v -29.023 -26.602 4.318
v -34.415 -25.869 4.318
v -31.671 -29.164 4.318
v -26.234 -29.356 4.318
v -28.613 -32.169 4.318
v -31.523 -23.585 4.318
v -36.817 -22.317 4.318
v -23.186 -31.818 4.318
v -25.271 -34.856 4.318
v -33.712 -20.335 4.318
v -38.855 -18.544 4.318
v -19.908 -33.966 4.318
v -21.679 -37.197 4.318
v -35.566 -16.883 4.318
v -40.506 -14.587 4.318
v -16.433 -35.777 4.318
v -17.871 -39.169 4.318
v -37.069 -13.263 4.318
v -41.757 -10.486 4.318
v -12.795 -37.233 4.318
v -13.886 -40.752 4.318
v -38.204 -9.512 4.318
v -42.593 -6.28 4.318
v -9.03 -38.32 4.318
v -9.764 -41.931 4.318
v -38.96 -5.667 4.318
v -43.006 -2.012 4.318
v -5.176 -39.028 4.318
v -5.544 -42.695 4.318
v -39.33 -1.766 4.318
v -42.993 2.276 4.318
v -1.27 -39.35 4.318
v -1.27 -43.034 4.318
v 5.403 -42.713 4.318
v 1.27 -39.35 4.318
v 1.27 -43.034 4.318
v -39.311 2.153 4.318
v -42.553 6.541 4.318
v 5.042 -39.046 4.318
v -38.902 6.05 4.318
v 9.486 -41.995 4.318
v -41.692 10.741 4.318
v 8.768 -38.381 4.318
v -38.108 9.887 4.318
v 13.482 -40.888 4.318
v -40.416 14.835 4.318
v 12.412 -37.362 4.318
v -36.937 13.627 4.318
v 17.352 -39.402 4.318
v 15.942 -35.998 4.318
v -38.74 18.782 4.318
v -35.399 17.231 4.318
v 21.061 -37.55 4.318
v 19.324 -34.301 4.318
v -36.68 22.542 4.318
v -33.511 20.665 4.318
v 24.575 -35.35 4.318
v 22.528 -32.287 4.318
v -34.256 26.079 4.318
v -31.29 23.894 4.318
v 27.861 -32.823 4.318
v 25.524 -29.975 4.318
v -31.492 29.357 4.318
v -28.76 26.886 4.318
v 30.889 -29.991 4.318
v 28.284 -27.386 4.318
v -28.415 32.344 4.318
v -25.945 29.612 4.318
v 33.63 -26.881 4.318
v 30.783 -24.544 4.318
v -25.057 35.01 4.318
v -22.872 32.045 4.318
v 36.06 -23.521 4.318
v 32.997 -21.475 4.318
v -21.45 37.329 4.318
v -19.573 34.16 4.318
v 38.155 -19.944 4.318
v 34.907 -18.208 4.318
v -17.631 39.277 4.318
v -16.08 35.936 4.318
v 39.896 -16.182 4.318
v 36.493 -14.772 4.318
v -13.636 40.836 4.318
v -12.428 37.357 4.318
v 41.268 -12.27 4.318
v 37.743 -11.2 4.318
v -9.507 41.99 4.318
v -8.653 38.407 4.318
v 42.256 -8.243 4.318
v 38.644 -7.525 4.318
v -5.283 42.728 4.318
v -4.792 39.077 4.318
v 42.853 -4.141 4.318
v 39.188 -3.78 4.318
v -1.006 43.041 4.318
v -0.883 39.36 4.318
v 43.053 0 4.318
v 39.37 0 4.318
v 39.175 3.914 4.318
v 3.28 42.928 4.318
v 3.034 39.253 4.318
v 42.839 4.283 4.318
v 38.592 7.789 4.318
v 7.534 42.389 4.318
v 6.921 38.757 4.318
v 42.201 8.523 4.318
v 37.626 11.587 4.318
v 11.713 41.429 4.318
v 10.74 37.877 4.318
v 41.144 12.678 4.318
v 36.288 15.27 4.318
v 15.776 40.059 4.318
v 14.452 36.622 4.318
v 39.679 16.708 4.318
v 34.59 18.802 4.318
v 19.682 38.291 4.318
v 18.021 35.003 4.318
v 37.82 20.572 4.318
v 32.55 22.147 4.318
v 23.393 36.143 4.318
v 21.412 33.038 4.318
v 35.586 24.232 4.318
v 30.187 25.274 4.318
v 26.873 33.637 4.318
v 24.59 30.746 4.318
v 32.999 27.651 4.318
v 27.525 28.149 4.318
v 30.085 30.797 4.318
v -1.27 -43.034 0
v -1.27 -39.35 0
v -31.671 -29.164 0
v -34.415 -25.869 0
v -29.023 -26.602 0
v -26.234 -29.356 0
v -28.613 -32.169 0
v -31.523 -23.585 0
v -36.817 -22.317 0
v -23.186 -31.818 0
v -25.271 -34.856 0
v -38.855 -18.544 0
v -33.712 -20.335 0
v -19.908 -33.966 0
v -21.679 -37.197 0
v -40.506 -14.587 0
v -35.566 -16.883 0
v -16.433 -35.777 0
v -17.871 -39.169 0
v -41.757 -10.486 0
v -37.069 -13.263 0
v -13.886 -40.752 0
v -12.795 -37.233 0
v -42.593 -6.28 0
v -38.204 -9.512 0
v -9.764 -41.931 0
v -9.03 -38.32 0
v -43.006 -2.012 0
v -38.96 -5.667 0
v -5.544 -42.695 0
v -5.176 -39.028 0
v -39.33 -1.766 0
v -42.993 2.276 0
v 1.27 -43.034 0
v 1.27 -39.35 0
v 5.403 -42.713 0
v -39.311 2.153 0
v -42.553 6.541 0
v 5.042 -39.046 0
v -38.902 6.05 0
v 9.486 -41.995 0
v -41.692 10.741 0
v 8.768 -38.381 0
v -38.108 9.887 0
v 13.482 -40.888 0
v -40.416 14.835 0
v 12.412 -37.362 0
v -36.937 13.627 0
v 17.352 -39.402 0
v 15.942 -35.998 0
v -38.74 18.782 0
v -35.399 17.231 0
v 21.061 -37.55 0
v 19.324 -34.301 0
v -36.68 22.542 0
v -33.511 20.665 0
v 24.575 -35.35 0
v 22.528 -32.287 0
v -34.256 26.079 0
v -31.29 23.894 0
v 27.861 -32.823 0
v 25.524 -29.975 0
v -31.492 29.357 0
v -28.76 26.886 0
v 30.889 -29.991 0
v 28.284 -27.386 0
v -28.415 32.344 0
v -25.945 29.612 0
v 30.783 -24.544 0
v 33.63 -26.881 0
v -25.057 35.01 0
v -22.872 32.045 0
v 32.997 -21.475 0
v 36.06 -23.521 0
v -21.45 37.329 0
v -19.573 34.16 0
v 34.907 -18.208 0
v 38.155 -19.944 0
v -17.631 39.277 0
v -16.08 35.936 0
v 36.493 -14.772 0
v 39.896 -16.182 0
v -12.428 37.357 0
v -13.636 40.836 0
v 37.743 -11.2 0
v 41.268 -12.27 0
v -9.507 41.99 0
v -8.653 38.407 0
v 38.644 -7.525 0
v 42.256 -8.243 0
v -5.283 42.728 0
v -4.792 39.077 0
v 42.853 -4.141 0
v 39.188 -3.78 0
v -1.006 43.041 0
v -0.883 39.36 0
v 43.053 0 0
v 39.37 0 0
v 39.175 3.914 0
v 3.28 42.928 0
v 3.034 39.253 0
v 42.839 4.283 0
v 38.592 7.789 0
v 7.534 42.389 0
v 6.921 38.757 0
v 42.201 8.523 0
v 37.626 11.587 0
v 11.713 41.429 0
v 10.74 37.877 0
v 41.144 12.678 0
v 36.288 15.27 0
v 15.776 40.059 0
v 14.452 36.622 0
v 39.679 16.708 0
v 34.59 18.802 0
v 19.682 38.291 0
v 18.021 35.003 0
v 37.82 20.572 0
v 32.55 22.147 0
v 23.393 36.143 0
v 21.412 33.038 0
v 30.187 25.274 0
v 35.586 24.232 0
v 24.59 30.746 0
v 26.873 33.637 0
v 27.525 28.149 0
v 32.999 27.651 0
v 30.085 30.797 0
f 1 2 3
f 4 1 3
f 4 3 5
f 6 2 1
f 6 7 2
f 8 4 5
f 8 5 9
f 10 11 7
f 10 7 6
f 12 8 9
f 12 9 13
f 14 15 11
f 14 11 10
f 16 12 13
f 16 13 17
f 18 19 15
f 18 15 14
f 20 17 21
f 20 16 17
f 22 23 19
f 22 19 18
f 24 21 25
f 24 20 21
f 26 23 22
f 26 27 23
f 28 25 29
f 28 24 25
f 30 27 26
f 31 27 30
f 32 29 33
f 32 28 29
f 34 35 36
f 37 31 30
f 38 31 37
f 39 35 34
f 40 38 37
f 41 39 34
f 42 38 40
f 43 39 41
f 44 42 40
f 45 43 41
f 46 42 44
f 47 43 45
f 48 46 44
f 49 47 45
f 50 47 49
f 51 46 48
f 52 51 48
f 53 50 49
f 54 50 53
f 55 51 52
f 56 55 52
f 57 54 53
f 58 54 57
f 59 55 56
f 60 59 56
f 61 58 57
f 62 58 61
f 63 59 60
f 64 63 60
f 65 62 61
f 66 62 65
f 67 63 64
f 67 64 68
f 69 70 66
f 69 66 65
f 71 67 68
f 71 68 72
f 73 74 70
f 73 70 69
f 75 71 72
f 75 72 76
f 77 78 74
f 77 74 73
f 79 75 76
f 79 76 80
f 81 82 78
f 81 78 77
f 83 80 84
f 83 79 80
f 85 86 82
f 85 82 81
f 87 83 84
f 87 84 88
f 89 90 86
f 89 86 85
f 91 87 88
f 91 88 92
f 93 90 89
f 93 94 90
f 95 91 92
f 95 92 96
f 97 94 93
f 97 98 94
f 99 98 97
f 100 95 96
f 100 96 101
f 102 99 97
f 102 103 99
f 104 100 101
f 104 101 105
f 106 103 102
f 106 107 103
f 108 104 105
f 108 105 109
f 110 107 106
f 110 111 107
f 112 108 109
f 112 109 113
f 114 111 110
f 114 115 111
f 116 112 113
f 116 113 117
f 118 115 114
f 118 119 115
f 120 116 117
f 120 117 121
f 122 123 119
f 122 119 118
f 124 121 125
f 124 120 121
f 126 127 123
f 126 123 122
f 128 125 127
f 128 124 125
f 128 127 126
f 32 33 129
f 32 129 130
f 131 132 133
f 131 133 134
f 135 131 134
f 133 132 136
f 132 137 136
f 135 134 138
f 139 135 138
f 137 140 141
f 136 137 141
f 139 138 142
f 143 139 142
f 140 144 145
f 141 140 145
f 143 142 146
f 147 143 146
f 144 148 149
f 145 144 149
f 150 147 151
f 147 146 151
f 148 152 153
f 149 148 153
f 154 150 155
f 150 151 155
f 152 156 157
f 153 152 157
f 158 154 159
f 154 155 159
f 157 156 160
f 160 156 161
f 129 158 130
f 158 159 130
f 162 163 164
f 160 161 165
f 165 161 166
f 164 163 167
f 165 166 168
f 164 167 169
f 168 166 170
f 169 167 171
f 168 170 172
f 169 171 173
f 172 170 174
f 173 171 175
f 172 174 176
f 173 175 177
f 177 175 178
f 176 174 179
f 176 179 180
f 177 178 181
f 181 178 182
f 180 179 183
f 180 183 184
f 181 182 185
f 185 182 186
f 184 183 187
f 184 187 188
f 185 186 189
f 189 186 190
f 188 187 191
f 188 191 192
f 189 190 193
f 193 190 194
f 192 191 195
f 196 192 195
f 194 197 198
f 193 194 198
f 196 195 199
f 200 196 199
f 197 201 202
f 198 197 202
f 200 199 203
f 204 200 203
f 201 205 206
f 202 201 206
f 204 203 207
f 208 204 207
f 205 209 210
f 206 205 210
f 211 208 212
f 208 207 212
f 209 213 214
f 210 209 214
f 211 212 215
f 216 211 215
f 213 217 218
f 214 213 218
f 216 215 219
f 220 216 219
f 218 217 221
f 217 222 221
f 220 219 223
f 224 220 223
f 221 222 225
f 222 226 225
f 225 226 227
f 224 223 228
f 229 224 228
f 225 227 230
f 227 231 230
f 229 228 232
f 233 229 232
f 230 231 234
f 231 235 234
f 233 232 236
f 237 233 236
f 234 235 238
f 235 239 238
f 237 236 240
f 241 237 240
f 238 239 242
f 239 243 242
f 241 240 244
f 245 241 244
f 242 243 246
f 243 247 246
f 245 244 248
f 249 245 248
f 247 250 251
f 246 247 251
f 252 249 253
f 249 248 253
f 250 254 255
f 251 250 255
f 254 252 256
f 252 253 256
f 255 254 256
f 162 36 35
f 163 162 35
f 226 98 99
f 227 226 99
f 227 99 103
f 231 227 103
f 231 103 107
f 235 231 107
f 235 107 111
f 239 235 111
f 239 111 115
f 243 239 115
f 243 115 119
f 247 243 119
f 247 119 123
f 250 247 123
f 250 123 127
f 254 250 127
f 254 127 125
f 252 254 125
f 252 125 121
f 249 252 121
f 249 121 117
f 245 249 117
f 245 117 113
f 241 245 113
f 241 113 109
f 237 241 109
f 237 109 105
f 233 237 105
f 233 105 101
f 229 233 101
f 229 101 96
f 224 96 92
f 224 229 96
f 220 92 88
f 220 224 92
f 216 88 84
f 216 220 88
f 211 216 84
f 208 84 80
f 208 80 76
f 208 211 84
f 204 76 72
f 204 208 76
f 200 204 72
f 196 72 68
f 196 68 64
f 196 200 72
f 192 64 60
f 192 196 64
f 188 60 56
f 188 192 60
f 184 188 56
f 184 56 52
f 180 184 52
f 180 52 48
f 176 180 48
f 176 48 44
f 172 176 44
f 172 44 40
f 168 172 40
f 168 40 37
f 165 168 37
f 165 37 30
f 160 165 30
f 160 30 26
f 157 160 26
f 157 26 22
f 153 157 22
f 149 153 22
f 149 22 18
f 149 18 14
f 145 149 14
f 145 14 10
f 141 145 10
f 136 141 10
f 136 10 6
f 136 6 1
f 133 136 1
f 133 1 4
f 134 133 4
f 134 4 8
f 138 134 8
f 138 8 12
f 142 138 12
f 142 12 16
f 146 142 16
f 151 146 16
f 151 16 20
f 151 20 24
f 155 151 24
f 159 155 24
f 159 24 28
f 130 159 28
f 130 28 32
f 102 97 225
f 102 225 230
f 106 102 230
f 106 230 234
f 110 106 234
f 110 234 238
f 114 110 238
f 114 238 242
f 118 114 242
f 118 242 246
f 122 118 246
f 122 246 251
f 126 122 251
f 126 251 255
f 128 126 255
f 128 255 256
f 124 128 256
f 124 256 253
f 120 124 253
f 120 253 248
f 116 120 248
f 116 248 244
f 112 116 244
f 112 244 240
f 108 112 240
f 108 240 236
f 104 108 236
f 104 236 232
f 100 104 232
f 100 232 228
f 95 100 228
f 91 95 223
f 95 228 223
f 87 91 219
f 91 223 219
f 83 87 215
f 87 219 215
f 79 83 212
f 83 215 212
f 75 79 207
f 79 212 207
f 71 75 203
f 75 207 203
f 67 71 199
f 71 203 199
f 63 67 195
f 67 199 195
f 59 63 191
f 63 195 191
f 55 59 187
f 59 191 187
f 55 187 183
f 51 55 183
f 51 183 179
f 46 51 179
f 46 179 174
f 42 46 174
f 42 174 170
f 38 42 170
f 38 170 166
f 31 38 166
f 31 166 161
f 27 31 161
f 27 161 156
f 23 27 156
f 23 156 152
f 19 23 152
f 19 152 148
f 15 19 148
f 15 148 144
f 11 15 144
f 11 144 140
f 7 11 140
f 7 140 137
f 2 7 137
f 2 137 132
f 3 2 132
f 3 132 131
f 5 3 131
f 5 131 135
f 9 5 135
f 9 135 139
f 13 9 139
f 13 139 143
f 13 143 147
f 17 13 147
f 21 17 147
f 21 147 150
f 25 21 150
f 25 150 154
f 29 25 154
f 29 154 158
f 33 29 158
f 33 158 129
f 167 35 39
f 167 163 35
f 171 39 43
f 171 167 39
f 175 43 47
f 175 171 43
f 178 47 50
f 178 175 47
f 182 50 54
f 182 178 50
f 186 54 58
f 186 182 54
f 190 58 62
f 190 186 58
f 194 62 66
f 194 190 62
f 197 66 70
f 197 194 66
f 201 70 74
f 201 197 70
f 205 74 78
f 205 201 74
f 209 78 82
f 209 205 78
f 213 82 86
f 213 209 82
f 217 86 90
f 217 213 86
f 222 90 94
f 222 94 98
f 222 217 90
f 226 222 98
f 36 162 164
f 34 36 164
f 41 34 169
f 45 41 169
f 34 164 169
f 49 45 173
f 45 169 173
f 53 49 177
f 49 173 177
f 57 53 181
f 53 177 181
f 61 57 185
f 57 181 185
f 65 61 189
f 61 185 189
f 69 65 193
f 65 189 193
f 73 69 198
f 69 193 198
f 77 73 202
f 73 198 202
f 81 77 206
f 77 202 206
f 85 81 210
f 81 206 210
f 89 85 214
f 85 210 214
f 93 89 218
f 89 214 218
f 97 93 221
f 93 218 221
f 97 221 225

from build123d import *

# Parameters (mm, degrees)
SKETCH1_R           = 43.053
SKETCH1_R_2         = 39.37
BOSS_EXTRUDE1_DEPTH = 4.318
SKETCH2_W           = 2.54
SKETCH2_H           = 4.749764311
CUT_EXTRUDE1_DEPTH  = 62.039059151


with BuildPart() as part:
    # Sketch1 → Boss-Extrude1 (new body)
    with BuildSketch(Plane.XY):
        Circle(SKETCH1_R)
        Circle(SKETCH1_R_2, mode=Mode.SUBTRACT)
    extrude(amount=BOSS_EXTRUDE1_DEPTH)

    # Sketch2 → Cut-Extrude1 (cut, through all)
    with BuildSketch(Plane.XY):
        with Locations((0, -41.724392952)):
            Rectangle(SKETCH2_W, SKETCH2_H)
    extrude(amount=CUT_EXTRUDE1_DEPTH, mode=Mode.SUBTRACT)


solid = part.part
